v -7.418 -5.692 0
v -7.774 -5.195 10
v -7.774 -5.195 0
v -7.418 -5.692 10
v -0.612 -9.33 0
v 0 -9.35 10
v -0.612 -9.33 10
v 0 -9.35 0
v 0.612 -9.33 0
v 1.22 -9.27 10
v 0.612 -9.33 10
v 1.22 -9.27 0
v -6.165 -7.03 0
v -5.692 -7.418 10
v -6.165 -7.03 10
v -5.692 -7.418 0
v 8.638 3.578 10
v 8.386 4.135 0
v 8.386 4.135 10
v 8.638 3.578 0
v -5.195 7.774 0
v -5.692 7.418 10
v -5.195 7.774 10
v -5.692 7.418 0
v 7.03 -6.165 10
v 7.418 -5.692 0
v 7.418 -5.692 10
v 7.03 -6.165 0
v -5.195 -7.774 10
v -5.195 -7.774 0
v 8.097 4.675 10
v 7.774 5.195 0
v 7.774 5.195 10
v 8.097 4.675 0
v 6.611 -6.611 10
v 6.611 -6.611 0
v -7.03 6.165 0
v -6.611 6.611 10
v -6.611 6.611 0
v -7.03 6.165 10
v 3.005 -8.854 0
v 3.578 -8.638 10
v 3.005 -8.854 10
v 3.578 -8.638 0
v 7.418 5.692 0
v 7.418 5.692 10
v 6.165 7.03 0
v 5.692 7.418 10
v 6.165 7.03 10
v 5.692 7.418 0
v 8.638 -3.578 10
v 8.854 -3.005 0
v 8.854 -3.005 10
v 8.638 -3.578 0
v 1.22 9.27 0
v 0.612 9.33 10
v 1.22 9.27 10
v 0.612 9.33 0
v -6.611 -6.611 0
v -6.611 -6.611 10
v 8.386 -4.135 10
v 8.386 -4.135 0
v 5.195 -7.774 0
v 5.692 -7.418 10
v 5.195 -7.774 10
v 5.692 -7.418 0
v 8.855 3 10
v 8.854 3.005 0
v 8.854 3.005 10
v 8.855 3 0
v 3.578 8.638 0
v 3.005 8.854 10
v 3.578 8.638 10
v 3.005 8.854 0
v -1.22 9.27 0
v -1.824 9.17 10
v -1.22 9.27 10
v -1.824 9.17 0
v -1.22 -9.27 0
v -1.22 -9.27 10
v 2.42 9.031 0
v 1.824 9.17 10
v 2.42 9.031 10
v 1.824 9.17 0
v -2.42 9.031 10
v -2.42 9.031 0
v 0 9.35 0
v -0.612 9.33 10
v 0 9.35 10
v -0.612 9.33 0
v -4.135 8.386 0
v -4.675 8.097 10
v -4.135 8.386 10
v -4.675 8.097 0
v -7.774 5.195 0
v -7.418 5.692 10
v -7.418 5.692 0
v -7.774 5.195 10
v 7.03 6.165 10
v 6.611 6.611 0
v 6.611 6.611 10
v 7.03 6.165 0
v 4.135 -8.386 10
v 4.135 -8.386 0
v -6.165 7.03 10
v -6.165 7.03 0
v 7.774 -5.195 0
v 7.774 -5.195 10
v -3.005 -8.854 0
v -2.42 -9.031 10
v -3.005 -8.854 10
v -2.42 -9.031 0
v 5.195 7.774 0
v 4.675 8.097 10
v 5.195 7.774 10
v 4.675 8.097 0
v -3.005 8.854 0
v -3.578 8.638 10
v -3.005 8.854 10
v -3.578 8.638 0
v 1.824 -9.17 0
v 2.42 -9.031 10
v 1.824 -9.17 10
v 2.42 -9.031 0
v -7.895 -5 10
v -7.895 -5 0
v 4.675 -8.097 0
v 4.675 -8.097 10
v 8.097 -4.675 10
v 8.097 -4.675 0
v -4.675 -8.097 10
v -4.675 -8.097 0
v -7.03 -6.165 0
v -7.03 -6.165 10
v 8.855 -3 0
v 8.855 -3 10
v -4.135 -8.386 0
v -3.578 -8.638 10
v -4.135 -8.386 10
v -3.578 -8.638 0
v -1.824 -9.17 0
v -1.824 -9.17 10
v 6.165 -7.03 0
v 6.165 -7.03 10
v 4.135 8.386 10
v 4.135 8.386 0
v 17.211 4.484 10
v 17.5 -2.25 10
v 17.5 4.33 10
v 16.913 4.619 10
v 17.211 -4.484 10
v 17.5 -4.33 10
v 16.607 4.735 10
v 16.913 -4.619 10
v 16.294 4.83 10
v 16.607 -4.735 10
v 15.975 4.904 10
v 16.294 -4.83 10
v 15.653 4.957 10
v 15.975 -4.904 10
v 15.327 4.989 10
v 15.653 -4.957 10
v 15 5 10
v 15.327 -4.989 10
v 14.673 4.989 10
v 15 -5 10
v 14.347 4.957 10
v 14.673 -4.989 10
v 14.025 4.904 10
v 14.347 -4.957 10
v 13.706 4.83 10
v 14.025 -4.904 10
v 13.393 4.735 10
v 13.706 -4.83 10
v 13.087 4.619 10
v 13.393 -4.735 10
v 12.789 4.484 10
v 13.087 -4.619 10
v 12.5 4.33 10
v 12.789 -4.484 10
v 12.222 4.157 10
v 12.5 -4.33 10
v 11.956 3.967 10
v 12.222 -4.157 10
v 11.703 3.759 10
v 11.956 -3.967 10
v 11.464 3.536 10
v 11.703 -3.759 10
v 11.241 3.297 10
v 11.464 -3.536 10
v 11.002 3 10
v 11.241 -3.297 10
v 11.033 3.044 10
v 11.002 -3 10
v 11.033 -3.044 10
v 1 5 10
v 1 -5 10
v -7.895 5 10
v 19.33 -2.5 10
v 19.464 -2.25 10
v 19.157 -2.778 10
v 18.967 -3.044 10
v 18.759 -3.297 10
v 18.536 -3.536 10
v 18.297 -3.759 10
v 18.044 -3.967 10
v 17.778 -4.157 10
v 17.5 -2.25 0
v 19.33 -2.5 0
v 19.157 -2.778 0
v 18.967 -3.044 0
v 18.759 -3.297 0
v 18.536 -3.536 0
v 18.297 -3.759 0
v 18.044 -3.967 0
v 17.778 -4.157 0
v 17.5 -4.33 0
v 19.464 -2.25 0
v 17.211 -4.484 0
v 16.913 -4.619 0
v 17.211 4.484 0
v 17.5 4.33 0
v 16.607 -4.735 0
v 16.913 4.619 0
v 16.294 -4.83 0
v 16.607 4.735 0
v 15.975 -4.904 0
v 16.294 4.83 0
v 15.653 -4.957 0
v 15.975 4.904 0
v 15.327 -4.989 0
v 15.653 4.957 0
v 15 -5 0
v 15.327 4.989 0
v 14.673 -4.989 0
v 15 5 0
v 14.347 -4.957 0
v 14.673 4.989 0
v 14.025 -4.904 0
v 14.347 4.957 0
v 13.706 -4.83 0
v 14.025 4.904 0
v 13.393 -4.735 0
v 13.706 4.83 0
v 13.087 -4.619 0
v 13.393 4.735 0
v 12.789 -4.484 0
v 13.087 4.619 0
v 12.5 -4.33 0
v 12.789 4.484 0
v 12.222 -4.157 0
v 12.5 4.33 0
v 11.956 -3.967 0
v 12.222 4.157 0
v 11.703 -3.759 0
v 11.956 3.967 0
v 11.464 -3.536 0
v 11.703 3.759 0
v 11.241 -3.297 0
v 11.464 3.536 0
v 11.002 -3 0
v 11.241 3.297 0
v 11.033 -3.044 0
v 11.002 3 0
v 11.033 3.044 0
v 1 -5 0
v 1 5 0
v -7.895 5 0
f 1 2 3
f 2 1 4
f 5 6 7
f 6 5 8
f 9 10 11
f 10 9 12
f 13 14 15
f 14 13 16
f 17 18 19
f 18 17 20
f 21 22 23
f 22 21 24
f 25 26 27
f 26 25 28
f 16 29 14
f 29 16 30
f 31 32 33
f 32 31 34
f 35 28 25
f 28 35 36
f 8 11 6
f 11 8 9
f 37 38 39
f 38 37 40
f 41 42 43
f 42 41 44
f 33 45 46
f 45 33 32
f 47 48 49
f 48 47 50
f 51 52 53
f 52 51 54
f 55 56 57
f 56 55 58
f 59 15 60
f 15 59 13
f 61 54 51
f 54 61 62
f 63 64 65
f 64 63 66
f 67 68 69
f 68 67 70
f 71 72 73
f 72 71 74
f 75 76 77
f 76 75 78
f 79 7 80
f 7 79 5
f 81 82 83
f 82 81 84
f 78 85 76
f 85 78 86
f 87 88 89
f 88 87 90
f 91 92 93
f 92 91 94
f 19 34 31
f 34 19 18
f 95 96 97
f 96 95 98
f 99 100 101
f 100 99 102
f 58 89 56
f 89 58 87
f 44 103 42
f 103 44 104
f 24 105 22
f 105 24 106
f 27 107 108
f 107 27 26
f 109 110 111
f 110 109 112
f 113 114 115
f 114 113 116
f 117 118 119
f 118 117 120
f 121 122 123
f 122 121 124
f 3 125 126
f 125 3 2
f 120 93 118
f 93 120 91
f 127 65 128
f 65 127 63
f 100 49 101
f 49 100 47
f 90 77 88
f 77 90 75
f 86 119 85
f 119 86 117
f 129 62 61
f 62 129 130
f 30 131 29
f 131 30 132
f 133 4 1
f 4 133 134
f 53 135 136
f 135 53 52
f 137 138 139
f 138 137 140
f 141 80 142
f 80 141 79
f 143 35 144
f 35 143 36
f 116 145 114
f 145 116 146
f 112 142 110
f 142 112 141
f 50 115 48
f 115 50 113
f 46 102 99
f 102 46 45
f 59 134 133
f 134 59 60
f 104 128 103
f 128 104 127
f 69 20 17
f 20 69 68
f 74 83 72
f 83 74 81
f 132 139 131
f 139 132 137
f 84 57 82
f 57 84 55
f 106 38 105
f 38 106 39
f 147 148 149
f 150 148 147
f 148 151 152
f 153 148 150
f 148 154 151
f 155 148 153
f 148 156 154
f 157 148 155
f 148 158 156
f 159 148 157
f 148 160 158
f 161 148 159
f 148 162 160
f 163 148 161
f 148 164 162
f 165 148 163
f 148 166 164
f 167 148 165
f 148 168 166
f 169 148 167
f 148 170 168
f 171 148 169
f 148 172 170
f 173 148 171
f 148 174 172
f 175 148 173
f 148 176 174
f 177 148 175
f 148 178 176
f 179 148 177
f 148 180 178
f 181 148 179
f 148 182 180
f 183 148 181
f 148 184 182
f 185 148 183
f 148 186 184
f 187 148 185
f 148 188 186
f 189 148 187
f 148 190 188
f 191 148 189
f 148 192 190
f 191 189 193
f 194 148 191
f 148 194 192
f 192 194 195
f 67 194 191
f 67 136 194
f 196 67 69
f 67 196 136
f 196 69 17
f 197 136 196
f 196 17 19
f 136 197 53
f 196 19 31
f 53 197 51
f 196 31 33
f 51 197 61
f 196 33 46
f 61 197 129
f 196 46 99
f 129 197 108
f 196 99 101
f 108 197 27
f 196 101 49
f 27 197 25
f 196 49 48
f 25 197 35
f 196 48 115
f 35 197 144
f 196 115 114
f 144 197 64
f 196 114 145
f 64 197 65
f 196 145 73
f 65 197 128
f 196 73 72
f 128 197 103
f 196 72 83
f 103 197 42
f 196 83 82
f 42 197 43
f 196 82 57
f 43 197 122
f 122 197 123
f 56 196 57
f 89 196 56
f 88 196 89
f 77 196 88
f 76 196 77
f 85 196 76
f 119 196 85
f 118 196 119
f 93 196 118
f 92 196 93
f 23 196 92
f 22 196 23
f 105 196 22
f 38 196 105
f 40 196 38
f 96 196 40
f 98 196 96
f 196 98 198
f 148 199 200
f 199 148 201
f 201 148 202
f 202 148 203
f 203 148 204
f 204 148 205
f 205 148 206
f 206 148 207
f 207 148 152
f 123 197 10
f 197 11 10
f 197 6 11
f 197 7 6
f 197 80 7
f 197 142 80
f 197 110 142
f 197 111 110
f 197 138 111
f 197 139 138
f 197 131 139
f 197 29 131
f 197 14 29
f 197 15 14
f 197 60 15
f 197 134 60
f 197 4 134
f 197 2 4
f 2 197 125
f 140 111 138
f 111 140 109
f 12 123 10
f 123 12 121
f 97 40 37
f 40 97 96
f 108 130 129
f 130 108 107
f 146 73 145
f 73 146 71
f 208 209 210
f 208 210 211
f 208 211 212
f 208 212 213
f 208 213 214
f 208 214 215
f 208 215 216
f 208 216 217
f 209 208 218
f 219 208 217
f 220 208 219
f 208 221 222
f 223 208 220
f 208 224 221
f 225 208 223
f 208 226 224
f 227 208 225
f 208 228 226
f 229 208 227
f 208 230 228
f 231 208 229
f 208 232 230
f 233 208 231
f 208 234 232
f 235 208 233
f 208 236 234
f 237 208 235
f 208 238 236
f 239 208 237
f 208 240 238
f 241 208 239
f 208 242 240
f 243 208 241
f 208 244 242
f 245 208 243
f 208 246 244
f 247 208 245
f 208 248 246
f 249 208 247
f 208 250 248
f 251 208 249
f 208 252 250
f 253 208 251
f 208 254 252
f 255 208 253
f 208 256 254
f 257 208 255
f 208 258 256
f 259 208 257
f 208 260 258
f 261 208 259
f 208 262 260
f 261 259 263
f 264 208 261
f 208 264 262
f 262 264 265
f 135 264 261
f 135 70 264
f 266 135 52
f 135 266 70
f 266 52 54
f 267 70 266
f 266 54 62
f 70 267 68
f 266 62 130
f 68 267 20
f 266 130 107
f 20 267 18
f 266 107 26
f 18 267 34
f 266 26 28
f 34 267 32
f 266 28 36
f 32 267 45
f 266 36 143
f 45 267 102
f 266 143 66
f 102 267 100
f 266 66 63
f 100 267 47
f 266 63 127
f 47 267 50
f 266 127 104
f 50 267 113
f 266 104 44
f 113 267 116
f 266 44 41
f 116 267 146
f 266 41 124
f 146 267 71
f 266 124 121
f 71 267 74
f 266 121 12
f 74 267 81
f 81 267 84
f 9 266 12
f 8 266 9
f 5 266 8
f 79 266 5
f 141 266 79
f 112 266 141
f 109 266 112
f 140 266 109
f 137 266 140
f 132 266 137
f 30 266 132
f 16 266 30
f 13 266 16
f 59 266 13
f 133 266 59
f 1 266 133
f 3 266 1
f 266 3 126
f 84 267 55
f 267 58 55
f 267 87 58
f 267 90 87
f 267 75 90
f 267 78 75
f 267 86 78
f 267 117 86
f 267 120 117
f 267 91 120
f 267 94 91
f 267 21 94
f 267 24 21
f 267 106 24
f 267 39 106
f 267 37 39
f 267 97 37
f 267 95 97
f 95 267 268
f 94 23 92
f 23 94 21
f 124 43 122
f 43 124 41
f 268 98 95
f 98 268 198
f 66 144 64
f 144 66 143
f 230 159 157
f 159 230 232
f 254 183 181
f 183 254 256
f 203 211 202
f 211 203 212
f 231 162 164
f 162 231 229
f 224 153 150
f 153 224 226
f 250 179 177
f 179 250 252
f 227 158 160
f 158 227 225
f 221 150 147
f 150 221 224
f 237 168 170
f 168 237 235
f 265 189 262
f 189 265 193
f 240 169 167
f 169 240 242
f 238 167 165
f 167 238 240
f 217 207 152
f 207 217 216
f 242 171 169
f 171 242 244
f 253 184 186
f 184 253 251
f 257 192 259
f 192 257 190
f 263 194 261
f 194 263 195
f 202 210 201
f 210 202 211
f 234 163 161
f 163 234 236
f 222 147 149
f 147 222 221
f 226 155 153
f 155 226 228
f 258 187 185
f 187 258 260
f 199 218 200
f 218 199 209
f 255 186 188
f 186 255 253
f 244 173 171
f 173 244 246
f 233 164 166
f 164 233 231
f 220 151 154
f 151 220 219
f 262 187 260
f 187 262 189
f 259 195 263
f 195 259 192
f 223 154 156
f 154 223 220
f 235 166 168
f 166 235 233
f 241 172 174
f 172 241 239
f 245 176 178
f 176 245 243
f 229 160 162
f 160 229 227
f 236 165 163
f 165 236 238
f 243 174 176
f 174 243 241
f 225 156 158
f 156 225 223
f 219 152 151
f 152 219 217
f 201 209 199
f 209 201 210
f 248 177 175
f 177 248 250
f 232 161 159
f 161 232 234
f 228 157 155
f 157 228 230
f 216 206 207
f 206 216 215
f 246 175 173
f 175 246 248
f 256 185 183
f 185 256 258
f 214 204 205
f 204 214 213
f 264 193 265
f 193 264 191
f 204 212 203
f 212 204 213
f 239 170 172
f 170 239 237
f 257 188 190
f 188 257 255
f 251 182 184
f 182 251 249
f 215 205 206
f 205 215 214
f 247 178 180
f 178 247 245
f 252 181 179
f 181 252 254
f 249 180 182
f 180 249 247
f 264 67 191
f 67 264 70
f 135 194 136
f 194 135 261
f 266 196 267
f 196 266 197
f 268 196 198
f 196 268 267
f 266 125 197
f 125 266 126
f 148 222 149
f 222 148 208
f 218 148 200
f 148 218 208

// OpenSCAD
// Tubing/stand rod snap-on clip
// Print orientation: flat on bed, z = 0 up to z = 10

$fn = 96;

// ---- Dimensions (mm) ----
stand_d      = 12.7;   // stand rod diameter
stand_wall   = 3;      // stand ring wall thickness
stand_open   = 10;     // stand ring opening width (y)
stand_r      = stand_d/2 + stand_wall; // stand ring outer radius = 9.35

tubing_d     = 6;      // tubing inner diameter
tubing_wall  = 2;      // tubing ring wall thickness
tubing_x     = 15;     // tubing ring centre x
tubing_open  = 4.5;    // tubing ring opening width (y)

bridge_w     = 6;      // bridge width (Y)
bridge_x0    = 8;      // bridge start (X)
bridge_x1    = 12;     // bridge end (X)

eps          = 0.5;    // cutter overshoot

// ---- Model ----
difference() {
    union() {
        // Stand ring
        cylinder(r = stand_r, h = 10);
        // Tubing ring
        translate([tubing_x, 0, 0])
            cylinder(d = tubing_d + 2*tubing_wall, h = 10);
        // Bridge
        translate([bridge_x0, -bridge_w/2, 0])
            cube([bridge_x1 - bridge_x0, bridge_w, 10]);
    }
    // Stand opening (x < 0, -5 < y < 5)
    translate([-stand_r - eps, -stand_open/2, -eps])
        cube([stand_r + eps + 1, stand_open, 10 + 2*eps]);
    // Tubing opening (x > 15, -2.25 < y < 2.25)
    translate([tubing_x + tubing_wall + eps, -tubing_open/2, -eps])
        cube([tubing_open, 10, 10 + 2*eps]);
}
